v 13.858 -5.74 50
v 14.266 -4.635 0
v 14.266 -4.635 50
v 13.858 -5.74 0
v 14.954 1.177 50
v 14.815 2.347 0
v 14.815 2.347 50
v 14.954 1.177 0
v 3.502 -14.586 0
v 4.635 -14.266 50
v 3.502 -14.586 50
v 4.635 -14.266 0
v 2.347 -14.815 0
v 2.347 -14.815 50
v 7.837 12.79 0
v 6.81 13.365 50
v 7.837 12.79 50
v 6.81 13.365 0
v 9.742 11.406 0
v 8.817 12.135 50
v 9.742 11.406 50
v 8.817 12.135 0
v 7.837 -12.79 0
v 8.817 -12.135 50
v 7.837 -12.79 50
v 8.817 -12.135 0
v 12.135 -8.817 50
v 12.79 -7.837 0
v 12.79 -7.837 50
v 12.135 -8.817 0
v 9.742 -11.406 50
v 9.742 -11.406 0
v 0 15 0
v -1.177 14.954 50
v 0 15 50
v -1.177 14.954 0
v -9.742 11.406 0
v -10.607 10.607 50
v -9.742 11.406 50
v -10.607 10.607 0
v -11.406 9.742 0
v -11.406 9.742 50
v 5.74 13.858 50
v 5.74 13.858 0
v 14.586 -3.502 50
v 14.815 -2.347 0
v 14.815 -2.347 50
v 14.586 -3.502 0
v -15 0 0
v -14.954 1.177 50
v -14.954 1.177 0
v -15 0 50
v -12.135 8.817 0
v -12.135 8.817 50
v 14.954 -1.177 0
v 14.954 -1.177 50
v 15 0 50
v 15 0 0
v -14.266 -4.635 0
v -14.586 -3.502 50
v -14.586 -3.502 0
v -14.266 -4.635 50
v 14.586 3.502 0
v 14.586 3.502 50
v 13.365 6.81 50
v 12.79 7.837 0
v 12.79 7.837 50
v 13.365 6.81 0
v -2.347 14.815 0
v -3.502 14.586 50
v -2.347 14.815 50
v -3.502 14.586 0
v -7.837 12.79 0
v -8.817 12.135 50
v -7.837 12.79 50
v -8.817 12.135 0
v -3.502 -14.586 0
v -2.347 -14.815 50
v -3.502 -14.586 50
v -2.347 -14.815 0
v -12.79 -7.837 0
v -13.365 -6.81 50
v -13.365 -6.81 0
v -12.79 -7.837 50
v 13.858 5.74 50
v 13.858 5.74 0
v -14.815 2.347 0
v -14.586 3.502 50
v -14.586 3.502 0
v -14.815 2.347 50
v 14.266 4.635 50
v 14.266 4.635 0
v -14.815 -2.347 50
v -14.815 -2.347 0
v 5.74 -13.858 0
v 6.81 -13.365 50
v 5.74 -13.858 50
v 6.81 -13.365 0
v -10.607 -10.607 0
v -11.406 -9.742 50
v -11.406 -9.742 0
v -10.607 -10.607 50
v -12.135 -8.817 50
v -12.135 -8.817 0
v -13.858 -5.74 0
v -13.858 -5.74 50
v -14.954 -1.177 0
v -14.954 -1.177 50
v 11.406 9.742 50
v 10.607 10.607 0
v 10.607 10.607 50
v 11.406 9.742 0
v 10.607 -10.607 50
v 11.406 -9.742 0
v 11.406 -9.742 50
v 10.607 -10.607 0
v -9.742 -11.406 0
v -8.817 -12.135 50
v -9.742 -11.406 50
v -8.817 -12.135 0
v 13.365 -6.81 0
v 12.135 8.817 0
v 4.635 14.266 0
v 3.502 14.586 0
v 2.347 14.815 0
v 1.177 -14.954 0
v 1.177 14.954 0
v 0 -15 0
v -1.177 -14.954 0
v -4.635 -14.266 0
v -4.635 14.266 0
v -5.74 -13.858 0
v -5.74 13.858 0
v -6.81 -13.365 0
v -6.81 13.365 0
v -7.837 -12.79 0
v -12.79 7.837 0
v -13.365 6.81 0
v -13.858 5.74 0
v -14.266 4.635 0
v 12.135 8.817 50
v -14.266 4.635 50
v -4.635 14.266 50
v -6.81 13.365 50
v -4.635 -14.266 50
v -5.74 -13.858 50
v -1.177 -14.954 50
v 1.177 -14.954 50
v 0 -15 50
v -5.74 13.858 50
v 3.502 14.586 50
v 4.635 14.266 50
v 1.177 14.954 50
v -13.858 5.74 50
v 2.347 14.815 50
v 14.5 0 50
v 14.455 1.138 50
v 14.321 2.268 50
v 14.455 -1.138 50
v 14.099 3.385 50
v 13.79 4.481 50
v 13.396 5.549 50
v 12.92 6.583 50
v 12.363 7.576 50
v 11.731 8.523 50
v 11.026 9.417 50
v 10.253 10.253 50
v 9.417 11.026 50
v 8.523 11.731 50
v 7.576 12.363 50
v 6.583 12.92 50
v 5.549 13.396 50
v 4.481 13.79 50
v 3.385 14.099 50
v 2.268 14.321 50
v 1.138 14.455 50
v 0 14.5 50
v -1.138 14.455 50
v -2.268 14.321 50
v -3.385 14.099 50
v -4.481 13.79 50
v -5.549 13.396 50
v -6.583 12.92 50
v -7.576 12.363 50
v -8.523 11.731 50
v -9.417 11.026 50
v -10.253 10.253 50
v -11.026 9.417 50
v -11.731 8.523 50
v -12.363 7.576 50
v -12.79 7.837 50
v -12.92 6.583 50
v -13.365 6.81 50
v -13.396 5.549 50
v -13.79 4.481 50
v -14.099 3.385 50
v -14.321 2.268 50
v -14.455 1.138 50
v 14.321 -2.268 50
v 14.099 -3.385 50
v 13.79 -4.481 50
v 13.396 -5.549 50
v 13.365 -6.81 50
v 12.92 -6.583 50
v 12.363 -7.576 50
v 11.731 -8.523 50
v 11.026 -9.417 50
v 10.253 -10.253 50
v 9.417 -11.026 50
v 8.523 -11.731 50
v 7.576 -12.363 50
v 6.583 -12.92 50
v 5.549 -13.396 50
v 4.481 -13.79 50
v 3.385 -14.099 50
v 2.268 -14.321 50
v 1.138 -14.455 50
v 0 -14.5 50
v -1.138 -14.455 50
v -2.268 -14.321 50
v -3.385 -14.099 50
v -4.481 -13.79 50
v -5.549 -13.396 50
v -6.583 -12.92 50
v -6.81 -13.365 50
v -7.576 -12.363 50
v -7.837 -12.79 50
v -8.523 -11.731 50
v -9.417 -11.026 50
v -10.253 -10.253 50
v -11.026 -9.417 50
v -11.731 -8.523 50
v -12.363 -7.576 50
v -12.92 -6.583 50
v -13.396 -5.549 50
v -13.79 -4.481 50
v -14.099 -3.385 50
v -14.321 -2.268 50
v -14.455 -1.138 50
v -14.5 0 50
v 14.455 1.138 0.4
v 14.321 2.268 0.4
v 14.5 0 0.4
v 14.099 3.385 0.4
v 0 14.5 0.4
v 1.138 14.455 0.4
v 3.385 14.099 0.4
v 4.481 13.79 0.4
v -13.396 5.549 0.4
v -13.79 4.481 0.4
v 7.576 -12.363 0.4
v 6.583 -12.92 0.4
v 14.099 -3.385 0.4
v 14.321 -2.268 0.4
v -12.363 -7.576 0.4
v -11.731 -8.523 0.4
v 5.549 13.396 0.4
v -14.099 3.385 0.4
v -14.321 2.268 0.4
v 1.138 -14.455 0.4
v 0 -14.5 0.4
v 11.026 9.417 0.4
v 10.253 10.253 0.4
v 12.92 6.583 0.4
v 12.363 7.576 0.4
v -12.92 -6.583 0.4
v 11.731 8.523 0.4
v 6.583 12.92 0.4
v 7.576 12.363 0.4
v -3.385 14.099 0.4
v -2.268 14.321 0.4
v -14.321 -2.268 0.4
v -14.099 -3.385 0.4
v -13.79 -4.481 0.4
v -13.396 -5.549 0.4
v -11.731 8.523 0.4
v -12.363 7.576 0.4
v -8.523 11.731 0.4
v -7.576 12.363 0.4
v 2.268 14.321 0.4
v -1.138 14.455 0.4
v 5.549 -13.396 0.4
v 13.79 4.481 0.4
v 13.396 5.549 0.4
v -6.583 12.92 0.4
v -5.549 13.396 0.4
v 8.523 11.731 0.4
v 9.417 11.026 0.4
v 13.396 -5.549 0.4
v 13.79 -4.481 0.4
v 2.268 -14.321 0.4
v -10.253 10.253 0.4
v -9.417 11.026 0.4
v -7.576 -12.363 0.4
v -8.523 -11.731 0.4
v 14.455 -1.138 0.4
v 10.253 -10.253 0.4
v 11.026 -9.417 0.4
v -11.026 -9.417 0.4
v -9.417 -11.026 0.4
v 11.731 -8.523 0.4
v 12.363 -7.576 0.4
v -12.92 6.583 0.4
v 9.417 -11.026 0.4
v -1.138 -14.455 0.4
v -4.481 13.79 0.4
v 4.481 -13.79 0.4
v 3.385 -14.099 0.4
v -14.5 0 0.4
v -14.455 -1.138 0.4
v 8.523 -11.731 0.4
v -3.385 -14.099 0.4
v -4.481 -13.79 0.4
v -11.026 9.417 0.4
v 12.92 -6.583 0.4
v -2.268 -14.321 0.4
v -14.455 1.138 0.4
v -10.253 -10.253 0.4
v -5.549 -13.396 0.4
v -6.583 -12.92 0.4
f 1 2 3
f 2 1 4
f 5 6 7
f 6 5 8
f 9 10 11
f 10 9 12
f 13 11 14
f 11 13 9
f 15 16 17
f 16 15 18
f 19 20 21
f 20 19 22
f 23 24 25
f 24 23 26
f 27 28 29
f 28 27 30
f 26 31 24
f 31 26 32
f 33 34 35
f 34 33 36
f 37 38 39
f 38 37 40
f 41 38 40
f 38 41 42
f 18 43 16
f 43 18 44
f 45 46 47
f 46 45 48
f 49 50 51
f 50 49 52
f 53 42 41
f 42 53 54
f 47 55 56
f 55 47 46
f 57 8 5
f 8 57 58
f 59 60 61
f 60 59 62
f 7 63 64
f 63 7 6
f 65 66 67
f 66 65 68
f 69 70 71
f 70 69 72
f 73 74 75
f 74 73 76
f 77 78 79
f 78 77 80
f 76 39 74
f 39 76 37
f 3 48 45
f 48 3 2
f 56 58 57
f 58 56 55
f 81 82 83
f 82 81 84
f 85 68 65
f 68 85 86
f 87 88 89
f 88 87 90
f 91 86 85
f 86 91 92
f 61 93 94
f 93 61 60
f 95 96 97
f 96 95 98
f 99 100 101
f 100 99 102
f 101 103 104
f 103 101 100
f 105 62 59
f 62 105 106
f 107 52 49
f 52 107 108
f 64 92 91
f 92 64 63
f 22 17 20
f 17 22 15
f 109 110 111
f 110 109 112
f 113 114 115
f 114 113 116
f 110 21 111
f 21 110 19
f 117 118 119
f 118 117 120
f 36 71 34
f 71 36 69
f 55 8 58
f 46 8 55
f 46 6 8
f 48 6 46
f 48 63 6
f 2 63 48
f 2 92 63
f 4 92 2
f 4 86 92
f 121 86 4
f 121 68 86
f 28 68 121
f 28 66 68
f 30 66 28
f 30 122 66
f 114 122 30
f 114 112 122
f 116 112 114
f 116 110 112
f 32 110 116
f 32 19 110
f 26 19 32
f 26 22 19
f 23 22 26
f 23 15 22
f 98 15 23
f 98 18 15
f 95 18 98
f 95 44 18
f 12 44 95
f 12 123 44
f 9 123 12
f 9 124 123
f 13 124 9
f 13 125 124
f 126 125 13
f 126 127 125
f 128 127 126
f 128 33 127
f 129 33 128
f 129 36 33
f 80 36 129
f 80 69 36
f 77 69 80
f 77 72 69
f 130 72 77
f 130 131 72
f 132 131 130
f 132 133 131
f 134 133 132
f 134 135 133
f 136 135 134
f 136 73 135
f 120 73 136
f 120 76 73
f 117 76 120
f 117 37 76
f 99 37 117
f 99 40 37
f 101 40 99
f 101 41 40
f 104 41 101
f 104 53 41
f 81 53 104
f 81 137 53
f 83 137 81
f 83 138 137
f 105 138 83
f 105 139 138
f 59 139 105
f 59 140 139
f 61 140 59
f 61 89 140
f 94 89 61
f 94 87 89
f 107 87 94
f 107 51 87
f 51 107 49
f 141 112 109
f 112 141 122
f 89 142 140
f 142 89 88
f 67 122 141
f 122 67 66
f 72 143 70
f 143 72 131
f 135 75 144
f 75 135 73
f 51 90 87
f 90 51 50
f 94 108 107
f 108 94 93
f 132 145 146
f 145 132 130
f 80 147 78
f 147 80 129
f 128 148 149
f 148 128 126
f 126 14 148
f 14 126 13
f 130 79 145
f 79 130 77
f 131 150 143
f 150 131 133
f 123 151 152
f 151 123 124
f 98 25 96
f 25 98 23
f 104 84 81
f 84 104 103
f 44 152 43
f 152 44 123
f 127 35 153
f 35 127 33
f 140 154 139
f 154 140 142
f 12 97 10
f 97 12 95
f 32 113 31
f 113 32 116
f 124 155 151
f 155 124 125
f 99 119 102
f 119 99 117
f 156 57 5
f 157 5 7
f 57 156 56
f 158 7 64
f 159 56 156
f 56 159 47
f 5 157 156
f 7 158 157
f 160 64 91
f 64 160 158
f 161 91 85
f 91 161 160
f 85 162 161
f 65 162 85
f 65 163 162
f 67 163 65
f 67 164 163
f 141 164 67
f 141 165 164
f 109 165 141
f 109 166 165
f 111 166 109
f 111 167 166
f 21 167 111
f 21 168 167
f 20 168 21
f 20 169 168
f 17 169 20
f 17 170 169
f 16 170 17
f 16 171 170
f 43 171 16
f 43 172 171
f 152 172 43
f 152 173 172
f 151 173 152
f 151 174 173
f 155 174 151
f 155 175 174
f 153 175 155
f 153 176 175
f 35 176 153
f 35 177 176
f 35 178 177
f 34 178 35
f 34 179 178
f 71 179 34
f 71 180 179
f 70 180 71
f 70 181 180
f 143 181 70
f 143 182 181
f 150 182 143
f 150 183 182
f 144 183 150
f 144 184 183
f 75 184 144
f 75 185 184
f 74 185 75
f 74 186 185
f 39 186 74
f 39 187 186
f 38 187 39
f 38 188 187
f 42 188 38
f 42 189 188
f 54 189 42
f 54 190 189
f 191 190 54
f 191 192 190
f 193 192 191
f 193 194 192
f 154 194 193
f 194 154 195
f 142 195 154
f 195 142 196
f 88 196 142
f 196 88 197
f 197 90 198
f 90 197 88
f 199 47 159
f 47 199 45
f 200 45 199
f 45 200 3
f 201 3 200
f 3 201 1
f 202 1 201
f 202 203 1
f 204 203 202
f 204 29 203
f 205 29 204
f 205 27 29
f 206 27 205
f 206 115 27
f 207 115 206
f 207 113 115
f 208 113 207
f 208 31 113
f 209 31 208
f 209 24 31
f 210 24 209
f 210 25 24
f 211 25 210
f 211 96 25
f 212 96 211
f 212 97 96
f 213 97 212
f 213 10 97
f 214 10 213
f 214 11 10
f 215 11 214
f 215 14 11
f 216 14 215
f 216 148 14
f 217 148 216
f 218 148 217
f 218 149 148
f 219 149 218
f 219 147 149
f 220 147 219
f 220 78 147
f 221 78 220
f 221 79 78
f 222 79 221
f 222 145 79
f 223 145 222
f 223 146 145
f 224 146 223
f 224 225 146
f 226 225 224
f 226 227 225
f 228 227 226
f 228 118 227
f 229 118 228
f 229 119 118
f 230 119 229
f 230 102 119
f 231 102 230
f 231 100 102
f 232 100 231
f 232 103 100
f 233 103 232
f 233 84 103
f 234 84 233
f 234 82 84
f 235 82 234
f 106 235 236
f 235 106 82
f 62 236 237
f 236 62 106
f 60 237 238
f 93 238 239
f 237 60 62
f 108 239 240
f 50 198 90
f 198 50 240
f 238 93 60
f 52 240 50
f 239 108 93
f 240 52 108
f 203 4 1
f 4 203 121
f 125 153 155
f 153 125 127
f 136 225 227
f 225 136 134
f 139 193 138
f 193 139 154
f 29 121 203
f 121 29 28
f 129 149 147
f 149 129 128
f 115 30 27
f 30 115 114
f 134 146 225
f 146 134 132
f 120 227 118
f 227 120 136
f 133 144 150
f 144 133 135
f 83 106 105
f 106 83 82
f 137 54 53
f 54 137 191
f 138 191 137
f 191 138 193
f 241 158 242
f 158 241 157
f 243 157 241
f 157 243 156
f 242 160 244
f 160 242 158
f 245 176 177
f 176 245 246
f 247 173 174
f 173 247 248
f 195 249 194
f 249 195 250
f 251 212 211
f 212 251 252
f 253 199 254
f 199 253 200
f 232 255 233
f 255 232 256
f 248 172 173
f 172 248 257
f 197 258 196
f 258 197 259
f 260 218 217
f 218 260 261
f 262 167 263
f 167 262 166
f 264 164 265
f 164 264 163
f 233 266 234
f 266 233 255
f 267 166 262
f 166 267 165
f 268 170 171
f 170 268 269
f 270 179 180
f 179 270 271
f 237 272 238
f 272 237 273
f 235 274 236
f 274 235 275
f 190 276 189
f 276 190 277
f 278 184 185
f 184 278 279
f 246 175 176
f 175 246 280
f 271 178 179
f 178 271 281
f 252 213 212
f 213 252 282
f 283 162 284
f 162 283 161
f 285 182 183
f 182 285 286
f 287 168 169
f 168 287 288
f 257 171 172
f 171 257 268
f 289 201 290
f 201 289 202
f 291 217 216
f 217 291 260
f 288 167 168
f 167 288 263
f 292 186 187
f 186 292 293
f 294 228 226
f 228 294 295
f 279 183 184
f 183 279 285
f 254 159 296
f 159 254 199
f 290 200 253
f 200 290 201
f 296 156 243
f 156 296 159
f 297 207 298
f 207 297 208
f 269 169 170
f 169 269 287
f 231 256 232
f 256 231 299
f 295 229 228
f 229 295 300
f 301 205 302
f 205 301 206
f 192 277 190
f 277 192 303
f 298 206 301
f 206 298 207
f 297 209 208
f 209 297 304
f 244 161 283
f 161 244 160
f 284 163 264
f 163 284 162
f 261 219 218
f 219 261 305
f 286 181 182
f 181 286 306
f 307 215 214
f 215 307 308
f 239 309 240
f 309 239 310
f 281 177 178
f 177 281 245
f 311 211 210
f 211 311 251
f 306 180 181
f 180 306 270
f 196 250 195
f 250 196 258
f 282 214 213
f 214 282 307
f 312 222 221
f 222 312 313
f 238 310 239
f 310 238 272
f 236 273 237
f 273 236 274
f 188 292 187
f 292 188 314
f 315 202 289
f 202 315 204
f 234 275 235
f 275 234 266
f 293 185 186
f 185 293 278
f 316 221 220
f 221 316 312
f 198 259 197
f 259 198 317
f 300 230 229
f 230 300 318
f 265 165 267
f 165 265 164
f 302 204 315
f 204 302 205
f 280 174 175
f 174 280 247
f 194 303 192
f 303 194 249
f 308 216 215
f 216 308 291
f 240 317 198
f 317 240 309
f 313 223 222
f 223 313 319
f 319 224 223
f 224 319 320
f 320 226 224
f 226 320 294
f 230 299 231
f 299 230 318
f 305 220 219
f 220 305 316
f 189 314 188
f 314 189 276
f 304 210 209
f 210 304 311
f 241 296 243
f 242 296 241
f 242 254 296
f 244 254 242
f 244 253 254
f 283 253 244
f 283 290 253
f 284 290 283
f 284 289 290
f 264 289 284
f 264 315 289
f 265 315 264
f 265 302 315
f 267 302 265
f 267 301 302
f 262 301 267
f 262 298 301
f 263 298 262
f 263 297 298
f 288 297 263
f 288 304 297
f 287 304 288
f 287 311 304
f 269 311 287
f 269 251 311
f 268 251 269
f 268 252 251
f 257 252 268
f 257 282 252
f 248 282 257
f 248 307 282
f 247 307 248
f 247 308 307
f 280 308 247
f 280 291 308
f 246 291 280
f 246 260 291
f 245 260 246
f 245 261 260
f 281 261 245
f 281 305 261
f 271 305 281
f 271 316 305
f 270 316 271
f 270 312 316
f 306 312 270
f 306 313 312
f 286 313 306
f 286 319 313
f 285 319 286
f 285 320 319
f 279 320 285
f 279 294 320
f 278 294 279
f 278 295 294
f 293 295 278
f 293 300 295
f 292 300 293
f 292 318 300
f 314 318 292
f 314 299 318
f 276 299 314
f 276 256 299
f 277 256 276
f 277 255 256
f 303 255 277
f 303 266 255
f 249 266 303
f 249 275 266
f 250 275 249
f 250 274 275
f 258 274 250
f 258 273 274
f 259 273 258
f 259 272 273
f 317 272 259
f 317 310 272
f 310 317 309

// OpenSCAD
t=0.5;


difference() {
  cylinder(r1=15, r2=15, h=50, $fn=80);
  cylinder(r1=15-t, r2=15-t, h=60, $fn=80); 
}
cylinder(r1=15, r2=15, h=0.4, $fn=80);
